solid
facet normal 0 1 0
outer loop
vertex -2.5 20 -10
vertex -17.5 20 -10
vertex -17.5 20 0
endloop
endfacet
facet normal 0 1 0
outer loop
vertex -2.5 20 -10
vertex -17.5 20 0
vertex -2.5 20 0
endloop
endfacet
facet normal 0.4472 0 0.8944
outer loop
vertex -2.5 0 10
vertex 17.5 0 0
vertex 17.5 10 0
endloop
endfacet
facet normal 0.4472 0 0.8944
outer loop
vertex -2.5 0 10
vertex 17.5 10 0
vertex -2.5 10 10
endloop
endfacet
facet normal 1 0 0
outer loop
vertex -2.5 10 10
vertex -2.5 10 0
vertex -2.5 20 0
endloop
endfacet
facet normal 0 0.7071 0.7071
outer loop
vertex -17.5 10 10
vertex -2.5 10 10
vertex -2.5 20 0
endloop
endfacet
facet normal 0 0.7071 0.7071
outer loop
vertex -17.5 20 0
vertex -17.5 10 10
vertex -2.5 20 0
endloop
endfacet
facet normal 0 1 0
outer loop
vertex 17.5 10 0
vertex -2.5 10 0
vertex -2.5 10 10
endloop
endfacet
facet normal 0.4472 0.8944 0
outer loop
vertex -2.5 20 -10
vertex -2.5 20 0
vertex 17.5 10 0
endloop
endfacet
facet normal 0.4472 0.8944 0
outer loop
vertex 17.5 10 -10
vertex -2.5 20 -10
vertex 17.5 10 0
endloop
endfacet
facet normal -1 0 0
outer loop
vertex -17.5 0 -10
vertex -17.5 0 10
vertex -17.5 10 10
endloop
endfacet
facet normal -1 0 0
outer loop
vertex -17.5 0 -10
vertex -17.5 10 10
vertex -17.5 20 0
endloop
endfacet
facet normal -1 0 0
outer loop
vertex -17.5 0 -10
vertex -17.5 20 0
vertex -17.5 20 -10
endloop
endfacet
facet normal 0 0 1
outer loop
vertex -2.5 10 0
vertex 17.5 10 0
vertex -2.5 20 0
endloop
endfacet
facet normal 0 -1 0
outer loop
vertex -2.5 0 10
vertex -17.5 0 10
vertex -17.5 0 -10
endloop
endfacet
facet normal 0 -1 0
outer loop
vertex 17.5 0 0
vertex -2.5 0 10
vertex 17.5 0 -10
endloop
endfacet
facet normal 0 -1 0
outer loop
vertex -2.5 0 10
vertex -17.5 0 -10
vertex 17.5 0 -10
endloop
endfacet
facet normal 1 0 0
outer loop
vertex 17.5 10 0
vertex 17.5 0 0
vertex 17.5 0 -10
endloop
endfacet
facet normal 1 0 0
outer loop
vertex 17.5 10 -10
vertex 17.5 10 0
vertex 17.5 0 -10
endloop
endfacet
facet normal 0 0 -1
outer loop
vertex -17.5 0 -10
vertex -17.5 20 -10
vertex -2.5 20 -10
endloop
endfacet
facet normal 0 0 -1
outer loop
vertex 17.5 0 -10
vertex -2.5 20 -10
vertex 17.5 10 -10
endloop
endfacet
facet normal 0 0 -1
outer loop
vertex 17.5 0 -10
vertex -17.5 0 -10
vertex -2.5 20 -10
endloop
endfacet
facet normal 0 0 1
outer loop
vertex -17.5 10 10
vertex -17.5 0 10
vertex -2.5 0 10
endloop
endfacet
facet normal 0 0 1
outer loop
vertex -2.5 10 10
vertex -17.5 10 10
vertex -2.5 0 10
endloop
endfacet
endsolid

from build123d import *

# Parameters (mm, degrees)
SKETCH_1_W          = 35
SKETCH_1_H          = 20
EXTRUDE_1_DEPTH     = 20
CUT_EXTRUDE_1_DEPTH = 20
CUT_EXTRUDE_2_DEPTH = 32
CUT_EXTRUDE_3_DEPTH = 10
CUT_EXTRUDE_4_DEPTH = 19


with BuildPart() as part:
    # 草圖1 → 填料-伸長1 (new body)
    with BuildSketch(Plane(origin=(0, 0, 0), x_dir=(1, 0, 0), z_dir=(0, 1, 0))):
        Rectangle(SKETCH_1_W, SKETCH_1_H)
    extrude(amount=EXTRUDE_1_DEPTH)

    # 草圖2 → 除料-伸長1 (cut)
    with BuildSketch(Plane.XY.offset(10)):
        Polygon((17.5, 20), (-2.5, 20), (17.5, 10), align=None)
    extrude(amount=-CUT_EXTRUDE_1_DEPTH, mode=Mode.SUBTRACT)

    # 草圖3 → 除料-伸長2 (cut)
    with BuildSketch(Plane(origin=(0, 0, 0), x_dir=(1, 0, 0), z_dir=(0, 1, 0))):
        Polygon((-2.5, -10), (17.5, -10), (17.5, 0), align=None)
    extrude(amount=CUT_EXTRUDE_2_DEPTH, mode=Mode.SUBTRACT)

    # 草圖4 → 除料-伸長3 (cut)
    with BuildSketch(Plane(origin=(0, 20, 0), x_dir=(1, 0, 0), z_dir=(0, 1, 0))):
        Polygon((17.5, 0), (-2.5, 0), (-2.5, -10), align=None)
    extrude(amount=-CUT_EXTRUDE_3_DEPTH, mode=Mode.SUBTRACT)

    # 草圖5 → 除料-伸長4 (cut)
    with BuildSketch(Plane(origin=(-2.5, 0, 0), x_dir=(0, 0, -1), z_dir=(1, 0, 0))):
        Polygon((0, 20), (-10, 20), (-10, 10), align=None)
    extrude(amount=-CUT_EXTRUDE_4_DEPTH, mode=Mode.SUBTRACT)


solid = part.part
